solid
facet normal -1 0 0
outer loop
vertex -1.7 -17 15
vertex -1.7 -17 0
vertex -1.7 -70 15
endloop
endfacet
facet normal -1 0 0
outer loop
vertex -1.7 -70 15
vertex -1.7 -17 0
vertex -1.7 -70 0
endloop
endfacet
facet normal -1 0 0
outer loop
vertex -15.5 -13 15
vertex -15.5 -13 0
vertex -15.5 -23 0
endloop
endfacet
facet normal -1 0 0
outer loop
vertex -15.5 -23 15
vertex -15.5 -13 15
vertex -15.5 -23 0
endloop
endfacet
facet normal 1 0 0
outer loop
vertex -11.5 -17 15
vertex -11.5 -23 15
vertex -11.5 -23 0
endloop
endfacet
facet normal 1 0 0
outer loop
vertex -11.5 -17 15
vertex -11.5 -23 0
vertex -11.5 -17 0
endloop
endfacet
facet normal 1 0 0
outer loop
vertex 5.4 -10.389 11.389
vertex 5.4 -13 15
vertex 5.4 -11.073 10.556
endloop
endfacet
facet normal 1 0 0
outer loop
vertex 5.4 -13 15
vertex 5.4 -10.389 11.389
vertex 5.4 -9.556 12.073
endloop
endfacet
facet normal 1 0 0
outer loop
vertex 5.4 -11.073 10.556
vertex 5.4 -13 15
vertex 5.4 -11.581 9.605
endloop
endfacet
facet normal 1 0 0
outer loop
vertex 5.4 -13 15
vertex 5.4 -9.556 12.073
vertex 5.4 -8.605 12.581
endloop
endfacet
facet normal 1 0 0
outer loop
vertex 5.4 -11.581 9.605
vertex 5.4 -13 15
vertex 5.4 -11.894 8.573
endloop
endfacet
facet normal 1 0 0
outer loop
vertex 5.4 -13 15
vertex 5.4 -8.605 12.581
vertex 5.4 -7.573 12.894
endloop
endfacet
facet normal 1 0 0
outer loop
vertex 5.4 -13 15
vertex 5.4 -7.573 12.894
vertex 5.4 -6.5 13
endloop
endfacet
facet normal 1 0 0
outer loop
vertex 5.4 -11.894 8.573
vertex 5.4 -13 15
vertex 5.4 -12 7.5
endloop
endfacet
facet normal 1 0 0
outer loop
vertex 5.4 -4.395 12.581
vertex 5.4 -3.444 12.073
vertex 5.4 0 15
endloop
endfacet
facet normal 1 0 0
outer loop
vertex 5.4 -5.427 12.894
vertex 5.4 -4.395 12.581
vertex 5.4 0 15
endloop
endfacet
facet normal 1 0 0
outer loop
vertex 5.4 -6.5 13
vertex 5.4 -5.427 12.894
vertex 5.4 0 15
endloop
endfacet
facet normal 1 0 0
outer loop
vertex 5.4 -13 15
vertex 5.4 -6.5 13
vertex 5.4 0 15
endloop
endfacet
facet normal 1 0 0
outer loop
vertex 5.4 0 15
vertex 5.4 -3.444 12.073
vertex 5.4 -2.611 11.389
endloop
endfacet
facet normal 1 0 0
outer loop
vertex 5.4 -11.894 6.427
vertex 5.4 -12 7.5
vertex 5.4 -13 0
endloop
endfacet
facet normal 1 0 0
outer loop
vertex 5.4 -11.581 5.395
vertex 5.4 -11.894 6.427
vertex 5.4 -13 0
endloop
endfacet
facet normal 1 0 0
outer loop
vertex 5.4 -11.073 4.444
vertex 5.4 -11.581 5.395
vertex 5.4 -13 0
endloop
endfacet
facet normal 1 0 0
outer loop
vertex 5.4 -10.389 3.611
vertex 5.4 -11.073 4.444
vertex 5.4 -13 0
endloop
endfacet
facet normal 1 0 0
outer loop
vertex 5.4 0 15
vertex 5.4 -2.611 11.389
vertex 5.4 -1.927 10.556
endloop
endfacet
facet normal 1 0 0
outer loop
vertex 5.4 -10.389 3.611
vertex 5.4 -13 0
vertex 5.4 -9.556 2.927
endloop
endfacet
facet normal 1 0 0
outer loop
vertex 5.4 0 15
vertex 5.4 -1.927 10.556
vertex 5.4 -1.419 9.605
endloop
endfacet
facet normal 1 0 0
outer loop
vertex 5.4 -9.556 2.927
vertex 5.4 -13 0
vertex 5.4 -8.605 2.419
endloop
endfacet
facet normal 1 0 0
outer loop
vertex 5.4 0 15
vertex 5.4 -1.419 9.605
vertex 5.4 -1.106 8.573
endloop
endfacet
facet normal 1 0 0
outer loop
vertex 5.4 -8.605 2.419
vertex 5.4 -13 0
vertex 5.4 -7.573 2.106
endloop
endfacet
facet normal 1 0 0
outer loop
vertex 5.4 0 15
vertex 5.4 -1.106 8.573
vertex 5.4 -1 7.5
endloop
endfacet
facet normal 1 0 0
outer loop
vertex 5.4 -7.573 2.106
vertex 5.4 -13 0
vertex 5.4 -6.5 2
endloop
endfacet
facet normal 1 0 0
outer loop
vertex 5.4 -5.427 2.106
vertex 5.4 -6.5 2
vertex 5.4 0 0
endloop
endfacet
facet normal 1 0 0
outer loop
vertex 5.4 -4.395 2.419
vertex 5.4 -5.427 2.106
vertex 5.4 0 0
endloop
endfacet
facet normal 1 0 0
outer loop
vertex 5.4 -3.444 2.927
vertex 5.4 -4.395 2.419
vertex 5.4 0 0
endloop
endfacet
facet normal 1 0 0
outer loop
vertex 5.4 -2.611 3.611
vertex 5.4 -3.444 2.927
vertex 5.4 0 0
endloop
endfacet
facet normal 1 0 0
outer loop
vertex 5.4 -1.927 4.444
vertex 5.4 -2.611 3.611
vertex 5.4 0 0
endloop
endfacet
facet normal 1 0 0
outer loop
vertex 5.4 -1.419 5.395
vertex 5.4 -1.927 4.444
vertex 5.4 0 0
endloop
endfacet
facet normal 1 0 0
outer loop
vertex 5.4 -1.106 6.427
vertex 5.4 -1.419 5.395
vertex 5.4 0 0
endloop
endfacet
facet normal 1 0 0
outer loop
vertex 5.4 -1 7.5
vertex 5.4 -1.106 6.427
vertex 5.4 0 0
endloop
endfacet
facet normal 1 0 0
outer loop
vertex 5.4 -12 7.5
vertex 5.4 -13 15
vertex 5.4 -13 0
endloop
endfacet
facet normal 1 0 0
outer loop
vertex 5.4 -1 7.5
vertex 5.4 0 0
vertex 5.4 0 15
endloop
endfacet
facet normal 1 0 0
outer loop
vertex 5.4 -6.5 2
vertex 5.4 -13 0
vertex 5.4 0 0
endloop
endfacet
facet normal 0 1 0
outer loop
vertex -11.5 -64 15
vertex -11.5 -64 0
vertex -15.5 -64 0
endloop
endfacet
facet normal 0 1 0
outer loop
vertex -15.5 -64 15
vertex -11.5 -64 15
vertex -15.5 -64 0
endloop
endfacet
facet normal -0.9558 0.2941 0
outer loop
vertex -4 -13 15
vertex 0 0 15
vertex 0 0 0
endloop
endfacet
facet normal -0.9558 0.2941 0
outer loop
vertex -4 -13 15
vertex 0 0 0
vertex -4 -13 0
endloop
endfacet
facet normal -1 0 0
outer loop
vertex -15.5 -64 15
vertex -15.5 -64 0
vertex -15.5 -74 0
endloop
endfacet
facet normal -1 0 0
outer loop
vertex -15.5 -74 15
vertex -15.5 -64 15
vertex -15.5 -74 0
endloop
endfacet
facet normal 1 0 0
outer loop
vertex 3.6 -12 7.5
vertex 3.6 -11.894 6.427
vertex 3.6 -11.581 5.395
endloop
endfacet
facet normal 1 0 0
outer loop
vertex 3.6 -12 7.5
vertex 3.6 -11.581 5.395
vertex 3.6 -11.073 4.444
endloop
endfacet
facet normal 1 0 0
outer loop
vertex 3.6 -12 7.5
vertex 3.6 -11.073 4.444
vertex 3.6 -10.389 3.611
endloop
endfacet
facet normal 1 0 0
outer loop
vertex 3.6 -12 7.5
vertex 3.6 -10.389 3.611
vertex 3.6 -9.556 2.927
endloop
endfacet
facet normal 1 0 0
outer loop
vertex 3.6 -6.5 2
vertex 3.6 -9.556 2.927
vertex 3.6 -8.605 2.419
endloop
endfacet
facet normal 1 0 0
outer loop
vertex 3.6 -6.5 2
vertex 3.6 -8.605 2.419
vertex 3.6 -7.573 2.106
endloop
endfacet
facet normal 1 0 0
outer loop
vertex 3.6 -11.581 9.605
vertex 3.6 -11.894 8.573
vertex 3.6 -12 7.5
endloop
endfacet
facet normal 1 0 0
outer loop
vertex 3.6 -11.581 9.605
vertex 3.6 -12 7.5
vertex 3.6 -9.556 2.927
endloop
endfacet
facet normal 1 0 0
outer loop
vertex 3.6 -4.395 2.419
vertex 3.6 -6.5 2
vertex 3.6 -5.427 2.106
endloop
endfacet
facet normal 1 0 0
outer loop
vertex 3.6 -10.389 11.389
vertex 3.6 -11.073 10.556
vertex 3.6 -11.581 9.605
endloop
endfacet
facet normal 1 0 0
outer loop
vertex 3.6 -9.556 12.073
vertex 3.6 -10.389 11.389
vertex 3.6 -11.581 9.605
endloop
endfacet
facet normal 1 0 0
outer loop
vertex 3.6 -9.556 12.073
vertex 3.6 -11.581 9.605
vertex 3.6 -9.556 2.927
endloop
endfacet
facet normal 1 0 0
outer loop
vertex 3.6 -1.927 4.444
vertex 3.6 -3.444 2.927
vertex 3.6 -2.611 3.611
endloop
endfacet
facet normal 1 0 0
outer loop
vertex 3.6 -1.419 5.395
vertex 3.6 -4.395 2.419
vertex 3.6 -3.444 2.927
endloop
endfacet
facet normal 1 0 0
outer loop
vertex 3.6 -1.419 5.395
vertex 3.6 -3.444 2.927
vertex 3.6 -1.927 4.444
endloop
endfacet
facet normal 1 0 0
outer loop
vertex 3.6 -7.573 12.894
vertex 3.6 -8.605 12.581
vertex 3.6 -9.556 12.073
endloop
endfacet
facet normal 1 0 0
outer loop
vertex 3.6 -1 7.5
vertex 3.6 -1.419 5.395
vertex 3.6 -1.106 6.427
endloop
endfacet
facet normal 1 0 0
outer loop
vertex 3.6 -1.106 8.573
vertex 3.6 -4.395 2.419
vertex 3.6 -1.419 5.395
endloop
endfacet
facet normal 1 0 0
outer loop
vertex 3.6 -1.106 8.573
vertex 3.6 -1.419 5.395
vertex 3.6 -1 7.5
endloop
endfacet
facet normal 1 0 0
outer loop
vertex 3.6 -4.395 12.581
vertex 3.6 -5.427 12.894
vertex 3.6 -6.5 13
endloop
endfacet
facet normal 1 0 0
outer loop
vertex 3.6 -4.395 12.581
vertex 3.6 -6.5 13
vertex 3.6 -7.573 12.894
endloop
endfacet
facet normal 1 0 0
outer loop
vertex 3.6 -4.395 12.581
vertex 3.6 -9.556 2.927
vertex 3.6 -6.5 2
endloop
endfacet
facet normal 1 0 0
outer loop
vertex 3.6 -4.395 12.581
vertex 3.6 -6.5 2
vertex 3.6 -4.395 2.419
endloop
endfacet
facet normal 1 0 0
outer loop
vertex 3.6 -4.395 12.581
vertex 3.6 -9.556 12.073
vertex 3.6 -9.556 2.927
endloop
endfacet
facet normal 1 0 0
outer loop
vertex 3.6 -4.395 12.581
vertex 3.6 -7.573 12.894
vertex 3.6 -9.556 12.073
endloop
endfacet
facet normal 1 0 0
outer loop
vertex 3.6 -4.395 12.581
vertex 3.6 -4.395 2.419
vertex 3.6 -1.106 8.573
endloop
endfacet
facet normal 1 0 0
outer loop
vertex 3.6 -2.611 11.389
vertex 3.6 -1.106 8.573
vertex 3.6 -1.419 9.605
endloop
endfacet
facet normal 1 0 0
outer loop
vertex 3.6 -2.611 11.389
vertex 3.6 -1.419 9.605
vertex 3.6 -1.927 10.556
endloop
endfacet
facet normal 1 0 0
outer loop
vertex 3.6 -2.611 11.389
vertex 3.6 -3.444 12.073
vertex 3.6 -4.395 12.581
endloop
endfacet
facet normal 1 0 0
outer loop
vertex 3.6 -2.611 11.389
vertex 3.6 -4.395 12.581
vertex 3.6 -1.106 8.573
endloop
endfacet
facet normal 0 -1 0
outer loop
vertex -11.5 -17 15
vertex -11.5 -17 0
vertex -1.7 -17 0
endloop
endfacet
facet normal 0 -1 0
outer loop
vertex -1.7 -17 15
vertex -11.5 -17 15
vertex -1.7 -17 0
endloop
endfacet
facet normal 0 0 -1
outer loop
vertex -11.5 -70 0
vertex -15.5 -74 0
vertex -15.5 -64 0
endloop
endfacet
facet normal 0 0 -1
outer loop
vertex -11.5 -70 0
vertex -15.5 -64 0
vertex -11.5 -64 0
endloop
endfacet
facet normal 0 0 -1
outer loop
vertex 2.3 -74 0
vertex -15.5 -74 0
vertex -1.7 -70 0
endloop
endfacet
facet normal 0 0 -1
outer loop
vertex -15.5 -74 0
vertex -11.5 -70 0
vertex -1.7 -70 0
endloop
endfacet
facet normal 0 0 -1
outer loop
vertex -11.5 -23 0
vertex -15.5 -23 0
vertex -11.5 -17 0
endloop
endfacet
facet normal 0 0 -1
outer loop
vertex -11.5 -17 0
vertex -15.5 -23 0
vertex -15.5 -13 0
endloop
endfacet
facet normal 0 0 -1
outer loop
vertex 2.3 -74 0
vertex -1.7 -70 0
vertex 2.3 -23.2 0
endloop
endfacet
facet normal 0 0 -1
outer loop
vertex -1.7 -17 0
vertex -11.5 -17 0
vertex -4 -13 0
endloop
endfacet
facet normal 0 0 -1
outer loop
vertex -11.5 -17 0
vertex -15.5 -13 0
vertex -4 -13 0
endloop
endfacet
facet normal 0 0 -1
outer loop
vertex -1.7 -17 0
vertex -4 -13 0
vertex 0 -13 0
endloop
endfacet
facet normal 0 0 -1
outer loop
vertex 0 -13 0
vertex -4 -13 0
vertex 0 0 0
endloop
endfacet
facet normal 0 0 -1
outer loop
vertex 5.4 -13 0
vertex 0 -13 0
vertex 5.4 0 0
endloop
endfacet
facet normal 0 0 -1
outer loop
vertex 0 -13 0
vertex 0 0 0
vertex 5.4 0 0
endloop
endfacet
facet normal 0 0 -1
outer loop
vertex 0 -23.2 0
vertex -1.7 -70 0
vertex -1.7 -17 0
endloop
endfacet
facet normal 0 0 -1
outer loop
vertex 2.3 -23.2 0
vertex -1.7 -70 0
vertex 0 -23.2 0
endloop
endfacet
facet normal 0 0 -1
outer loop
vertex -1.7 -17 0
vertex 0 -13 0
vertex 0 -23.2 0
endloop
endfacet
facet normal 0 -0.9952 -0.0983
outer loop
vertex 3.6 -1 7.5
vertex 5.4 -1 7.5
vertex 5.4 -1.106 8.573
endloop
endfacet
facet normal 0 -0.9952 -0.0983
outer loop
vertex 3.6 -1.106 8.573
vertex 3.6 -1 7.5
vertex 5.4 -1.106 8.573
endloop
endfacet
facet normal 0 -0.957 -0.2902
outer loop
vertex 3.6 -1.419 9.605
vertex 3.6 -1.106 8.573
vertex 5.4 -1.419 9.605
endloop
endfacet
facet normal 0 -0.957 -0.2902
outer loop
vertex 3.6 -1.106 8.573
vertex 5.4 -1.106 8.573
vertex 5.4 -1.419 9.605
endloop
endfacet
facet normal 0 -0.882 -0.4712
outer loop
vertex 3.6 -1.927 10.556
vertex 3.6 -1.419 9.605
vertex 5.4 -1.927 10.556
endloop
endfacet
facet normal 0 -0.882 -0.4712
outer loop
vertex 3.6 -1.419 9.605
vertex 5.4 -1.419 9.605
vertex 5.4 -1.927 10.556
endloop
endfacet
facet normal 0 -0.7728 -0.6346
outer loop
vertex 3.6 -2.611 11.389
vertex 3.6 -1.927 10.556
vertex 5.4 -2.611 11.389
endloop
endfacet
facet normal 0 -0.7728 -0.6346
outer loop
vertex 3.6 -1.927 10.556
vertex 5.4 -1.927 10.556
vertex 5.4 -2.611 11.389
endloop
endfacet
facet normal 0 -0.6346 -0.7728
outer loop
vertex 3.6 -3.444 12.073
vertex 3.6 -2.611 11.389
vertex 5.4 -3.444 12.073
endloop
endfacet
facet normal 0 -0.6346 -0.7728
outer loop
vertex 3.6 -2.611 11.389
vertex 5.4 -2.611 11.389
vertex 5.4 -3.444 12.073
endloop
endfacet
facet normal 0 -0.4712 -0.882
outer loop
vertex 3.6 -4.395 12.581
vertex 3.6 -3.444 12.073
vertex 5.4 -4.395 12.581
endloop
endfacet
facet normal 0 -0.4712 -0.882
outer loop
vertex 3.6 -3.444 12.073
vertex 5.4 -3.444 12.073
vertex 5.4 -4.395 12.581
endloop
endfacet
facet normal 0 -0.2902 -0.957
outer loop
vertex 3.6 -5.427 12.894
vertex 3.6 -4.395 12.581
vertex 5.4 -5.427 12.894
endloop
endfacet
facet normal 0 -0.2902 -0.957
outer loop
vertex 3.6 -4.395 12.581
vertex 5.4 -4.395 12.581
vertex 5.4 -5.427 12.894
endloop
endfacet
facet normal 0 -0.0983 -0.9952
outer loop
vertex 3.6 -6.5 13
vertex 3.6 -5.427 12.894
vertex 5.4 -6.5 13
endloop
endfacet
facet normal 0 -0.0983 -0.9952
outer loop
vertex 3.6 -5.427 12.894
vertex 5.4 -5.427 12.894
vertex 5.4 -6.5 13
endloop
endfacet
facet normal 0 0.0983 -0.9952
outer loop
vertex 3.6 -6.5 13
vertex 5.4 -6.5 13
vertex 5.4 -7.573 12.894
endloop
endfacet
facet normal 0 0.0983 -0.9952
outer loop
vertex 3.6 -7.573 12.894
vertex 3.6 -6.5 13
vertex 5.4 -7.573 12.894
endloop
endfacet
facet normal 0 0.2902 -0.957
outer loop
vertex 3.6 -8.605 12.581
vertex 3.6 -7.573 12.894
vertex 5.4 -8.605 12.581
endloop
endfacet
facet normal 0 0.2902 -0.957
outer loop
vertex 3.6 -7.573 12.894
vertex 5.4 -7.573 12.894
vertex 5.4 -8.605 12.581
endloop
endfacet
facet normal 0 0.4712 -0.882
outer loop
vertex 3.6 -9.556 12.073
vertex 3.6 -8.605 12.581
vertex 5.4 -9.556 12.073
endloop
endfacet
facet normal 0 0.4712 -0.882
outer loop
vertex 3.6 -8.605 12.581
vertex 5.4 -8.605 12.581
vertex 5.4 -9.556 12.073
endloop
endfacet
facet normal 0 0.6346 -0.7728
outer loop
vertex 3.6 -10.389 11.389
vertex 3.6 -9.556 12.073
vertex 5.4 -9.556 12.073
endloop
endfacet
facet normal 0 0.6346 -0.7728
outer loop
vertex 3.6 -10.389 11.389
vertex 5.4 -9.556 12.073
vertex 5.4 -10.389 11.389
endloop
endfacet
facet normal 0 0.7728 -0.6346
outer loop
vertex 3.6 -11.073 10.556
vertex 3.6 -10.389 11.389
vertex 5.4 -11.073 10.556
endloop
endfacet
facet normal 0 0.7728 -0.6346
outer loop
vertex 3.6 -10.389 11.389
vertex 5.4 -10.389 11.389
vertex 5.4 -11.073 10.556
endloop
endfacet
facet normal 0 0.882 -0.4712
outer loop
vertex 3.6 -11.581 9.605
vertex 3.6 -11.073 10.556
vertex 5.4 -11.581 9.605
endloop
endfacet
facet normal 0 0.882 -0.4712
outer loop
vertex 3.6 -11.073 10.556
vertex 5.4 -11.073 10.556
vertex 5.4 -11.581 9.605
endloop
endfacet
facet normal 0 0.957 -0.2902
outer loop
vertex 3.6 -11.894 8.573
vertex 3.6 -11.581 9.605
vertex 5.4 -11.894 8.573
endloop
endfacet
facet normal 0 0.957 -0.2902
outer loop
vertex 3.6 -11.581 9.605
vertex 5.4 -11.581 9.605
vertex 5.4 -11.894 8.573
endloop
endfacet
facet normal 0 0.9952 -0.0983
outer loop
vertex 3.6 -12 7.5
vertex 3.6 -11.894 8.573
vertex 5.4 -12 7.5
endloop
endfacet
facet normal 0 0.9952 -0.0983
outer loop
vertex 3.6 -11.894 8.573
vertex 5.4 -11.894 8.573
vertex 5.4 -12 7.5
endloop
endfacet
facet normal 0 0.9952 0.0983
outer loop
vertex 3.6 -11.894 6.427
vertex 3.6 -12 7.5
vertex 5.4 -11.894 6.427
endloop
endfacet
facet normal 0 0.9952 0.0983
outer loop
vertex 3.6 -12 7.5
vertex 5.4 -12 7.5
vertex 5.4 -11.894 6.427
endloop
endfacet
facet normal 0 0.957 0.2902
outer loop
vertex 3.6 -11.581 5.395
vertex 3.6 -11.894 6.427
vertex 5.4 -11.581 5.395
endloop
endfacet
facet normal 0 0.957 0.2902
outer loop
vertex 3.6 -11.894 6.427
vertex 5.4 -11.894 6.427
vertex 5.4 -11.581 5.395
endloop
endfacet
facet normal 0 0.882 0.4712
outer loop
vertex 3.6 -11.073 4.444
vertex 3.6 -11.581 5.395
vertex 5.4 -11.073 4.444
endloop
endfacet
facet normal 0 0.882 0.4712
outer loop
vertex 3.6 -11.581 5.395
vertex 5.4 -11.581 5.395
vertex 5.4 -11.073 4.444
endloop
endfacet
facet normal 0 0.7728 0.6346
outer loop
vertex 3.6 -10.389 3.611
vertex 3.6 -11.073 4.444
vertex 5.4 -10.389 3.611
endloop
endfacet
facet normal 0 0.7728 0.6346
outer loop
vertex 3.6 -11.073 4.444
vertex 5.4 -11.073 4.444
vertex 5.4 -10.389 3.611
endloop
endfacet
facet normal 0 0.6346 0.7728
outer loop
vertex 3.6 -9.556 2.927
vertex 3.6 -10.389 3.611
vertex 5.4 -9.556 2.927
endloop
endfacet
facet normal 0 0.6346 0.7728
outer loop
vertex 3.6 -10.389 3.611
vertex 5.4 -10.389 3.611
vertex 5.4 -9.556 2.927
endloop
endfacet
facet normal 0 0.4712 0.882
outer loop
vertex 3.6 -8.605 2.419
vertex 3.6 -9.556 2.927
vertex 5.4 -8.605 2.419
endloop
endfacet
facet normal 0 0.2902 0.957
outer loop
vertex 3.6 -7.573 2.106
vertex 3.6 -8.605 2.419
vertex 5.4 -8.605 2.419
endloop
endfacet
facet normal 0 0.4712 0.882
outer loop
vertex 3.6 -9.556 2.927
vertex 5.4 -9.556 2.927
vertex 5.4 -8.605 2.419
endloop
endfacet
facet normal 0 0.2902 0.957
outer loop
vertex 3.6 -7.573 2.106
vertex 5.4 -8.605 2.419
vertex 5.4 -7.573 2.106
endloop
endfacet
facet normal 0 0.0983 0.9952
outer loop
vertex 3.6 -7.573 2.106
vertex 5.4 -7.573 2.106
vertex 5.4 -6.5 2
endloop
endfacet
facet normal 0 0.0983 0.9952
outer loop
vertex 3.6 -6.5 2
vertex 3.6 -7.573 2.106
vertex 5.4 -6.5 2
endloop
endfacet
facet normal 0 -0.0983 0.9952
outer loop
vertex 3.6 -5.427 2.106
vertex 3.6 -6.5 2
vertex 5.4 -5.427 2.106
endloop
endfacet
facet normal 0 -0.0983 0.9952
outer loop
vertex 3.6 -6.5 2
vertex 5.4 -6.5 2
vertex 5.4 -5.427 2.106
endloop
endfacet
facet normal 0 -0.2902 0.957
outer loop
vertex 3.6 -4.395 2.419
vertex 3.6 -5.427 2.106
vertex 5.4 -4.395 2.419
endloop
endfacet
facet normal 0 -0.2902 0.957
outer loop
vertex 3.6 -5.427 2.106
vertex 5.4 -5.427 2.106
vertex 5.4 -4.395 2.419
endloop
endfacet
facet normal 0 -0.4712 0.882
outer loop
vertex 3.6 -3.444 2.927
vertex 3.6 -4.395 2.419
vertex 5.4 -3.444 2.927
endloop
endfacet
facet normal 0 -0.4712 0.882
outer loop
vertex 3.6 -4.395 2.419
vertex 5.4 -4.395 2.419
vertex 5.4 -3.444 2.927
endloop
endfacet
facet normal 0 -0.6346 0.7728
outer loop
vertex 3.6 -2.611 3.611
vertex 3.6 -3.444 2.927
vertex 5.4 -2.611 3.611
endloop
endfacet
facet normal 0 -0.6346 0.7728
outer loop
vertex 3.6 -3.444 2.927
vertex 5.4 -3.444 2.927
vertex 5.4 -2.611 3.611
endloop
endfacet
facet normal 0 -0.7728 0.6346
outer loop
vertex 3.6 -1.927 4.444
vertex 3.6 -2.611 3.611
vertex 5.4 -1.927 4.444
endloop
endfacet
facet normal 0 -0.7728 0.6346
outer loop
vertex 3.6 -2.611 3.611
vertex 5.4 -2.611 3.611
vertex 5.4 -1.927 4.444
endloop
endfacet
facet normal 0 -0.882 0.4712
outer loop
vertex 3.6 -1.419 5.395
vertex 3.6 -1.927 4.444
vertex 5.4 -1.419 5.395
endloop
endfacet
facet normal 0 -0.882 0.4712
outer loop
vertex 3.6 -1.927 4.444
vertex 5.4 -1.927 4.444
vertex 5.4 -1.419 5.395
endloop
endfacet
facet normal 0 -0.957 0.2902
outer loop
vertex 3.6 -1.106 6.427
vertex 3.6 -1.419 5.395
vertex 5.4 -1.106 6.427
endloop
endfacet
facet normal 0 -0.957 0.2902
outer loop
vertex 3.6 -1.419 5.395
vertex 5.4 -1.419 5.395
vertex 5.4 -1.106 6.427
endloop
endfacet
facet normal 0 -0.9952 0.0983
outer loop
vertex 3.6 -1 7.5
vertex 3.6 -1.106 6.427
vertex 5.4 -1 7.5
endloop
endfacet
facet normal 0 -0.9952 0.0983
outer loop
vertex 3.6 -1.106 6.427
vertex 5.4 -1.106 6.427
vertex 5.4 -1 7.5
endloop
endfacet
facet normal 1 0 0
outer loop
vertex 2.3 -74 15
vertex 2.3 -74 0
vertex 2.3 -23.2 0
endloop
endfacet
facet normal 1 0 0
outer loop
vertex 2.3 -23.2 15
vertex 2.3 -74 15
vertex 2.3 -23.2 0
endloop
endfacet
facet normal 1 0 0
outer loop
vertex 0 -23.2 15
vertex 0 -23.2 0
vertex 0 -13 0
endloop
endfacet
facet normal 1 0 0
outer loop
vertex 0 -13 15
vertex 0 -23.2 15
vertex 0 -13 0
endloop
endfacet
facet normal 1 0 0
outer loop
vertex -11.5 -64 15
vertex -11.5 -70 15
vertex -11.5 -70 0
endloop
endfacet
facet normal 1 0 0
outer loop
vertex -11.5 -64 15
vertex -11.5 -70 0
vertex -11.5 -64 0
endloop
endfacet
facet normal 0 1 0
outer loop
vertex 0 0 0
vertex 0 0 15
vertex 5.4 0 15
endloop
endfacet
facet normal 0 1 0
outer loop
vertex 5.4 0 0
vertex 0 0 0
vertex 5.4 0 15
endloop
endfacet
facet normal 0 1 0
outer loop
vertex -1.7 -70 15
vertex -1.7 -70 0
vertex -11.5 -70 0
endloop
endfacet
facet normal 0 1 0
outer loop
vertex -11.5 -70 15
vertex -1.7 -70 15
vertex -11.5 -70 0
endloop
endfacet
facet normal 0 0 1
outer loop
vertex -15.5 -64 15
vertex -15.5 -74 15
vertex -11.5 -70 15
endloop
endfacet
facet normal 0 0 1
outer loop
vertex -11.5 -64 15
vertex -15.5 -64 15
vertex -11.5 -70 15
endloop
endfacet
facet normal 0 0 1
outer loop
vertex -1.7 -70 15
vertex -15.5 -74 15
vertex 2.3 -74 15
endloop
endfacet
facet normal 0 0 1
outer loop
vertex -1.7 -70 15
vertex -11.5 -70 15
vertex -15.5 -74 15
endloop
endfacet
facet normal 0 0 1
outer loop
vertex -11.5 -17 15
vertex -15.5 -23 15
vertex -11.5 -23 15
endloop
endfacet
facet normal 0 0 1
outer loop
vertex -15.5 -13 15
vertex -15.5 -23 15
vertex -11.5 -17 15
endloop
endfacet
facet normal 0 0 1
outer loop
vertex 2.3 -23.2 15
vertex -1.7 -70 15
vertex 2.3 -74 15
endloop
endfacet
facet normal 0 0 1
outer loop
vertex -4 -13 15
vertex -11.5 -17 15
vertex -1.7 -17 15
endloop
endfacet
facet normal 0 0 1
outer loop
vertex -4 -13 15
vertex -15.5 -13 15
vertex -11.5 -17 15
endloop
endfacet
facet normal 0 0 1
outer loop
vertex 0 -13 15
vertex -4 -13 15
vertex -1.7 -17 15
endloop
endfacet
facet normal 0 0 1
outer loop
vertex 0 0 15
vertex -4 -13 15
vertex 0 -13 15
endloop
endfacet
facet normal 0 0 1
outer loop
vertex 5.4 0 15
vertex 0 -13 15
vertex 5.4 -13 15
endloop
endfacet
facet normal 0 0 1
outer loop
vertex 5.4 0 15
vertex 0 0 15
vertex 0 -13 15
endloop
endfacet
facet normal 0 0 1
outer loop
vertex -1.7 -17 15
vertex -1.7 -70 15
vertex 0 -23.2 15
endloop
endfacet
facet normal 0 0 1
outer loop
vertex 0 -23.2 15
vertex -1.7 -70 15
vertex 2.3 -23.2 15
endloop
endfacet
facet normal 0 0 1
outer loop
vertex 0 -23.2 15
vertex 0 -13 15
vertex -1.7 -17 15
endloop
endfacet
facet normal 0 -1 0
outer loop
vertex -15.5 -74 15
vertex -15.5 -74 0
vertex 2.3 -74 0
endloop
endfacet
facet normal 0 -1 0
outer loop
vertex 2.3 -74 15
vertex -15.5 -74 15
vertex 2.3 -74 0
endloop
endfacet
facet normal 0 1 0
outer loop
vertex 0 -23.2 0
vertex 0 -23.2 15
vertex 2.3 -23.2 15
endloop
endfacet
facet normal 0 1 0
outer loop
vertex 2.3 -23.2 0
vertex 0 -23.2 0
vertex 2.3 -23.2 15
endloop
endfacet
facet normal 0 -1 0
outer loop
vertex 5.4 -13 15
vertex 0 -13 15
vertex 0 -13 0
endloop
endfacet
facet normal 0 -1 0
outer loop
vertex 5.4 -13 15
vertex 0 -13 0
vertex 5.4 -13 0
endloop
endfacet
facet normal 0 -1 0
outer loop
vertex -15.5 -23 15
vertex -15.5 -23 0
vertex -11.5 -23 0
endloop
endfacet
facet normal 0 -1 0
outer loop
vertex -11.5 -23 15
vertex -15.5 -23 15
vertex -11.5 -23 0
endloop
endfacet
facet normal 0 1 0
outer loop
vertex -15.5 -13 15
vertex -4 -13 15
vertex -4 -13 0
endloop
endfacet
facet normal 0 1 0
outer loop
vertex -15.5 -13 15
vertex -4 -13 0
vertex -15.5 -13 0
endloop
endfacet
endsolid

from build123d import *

# Parameters (mm, degrees)
F0_W     = 2.3
F0_H     = 4
F0_W_2   = 5.4
F0_H_2   = 13
F0_W_3   = 1.7
F0_H_3   = 46.8
F0_W_4   = 4
F0_H_4   = 6
F1_DEPTH = 15
F2_R     = 5.5
F3_DEPTH = 1.8


# Not quite as in the source:
# - a feature names something its author has since deleted; it is built from what else it names


with BuildPart() as f1:
    # F0 (on Top) → F1 (new body)
    with BuildSketch(Plane.XY):
        Polygon((0, -23.2), (0, -13), (-1.7, -13), (-1.7, -17), (-1.7, -23.2), align=None)
        with Locations((-2.85, -15)):
            Rectangle(F0_W, F0_H)
        with Locations((2.7, -6.5)):
            Rectangle(F0_W_2, F0_H_2)
        with Locations((-0.85, -46.6)):
            Rectangle(F0_W_3, F0_H_3)
        Polygon((-11.5, -74), (-11.5, -70), (-11.5, -64), (-15.5, -64), (-15.5, -74), align=None)
        with Locations((1.15, -46.6)):
            Rectangle(F0_W, F0_H_3)
        Polygon((2.3, -70), (0, -70), (-1.7, -70), (-11.5, -70), (-11.5, -74), (2.3, -74), align=None)
        Polygon((0, -13), (0, 0), (-4, -13), (-1.7, -13), align=None)
        Polygon((-4, -17), (-4, -13), (-15.5, -13), (-15.5, -17), (-11.5, -17), align=None)
        with Locations((-13.5, -20)):
            Rectangle(F0_W_4, F0_H_4)
    extrude(amount=F1_DEPTH)

    # F2 (on face) → F3 (cut)
    with BuildSketch(Plane.YZ.offset(5.4)):
        with Locations((-6.5, 7.5)):
            Circle(F2_R)
    extrude(amount=-F3_DEPTH, mode=Mode.SUBTRACT)


solid = f1.part
